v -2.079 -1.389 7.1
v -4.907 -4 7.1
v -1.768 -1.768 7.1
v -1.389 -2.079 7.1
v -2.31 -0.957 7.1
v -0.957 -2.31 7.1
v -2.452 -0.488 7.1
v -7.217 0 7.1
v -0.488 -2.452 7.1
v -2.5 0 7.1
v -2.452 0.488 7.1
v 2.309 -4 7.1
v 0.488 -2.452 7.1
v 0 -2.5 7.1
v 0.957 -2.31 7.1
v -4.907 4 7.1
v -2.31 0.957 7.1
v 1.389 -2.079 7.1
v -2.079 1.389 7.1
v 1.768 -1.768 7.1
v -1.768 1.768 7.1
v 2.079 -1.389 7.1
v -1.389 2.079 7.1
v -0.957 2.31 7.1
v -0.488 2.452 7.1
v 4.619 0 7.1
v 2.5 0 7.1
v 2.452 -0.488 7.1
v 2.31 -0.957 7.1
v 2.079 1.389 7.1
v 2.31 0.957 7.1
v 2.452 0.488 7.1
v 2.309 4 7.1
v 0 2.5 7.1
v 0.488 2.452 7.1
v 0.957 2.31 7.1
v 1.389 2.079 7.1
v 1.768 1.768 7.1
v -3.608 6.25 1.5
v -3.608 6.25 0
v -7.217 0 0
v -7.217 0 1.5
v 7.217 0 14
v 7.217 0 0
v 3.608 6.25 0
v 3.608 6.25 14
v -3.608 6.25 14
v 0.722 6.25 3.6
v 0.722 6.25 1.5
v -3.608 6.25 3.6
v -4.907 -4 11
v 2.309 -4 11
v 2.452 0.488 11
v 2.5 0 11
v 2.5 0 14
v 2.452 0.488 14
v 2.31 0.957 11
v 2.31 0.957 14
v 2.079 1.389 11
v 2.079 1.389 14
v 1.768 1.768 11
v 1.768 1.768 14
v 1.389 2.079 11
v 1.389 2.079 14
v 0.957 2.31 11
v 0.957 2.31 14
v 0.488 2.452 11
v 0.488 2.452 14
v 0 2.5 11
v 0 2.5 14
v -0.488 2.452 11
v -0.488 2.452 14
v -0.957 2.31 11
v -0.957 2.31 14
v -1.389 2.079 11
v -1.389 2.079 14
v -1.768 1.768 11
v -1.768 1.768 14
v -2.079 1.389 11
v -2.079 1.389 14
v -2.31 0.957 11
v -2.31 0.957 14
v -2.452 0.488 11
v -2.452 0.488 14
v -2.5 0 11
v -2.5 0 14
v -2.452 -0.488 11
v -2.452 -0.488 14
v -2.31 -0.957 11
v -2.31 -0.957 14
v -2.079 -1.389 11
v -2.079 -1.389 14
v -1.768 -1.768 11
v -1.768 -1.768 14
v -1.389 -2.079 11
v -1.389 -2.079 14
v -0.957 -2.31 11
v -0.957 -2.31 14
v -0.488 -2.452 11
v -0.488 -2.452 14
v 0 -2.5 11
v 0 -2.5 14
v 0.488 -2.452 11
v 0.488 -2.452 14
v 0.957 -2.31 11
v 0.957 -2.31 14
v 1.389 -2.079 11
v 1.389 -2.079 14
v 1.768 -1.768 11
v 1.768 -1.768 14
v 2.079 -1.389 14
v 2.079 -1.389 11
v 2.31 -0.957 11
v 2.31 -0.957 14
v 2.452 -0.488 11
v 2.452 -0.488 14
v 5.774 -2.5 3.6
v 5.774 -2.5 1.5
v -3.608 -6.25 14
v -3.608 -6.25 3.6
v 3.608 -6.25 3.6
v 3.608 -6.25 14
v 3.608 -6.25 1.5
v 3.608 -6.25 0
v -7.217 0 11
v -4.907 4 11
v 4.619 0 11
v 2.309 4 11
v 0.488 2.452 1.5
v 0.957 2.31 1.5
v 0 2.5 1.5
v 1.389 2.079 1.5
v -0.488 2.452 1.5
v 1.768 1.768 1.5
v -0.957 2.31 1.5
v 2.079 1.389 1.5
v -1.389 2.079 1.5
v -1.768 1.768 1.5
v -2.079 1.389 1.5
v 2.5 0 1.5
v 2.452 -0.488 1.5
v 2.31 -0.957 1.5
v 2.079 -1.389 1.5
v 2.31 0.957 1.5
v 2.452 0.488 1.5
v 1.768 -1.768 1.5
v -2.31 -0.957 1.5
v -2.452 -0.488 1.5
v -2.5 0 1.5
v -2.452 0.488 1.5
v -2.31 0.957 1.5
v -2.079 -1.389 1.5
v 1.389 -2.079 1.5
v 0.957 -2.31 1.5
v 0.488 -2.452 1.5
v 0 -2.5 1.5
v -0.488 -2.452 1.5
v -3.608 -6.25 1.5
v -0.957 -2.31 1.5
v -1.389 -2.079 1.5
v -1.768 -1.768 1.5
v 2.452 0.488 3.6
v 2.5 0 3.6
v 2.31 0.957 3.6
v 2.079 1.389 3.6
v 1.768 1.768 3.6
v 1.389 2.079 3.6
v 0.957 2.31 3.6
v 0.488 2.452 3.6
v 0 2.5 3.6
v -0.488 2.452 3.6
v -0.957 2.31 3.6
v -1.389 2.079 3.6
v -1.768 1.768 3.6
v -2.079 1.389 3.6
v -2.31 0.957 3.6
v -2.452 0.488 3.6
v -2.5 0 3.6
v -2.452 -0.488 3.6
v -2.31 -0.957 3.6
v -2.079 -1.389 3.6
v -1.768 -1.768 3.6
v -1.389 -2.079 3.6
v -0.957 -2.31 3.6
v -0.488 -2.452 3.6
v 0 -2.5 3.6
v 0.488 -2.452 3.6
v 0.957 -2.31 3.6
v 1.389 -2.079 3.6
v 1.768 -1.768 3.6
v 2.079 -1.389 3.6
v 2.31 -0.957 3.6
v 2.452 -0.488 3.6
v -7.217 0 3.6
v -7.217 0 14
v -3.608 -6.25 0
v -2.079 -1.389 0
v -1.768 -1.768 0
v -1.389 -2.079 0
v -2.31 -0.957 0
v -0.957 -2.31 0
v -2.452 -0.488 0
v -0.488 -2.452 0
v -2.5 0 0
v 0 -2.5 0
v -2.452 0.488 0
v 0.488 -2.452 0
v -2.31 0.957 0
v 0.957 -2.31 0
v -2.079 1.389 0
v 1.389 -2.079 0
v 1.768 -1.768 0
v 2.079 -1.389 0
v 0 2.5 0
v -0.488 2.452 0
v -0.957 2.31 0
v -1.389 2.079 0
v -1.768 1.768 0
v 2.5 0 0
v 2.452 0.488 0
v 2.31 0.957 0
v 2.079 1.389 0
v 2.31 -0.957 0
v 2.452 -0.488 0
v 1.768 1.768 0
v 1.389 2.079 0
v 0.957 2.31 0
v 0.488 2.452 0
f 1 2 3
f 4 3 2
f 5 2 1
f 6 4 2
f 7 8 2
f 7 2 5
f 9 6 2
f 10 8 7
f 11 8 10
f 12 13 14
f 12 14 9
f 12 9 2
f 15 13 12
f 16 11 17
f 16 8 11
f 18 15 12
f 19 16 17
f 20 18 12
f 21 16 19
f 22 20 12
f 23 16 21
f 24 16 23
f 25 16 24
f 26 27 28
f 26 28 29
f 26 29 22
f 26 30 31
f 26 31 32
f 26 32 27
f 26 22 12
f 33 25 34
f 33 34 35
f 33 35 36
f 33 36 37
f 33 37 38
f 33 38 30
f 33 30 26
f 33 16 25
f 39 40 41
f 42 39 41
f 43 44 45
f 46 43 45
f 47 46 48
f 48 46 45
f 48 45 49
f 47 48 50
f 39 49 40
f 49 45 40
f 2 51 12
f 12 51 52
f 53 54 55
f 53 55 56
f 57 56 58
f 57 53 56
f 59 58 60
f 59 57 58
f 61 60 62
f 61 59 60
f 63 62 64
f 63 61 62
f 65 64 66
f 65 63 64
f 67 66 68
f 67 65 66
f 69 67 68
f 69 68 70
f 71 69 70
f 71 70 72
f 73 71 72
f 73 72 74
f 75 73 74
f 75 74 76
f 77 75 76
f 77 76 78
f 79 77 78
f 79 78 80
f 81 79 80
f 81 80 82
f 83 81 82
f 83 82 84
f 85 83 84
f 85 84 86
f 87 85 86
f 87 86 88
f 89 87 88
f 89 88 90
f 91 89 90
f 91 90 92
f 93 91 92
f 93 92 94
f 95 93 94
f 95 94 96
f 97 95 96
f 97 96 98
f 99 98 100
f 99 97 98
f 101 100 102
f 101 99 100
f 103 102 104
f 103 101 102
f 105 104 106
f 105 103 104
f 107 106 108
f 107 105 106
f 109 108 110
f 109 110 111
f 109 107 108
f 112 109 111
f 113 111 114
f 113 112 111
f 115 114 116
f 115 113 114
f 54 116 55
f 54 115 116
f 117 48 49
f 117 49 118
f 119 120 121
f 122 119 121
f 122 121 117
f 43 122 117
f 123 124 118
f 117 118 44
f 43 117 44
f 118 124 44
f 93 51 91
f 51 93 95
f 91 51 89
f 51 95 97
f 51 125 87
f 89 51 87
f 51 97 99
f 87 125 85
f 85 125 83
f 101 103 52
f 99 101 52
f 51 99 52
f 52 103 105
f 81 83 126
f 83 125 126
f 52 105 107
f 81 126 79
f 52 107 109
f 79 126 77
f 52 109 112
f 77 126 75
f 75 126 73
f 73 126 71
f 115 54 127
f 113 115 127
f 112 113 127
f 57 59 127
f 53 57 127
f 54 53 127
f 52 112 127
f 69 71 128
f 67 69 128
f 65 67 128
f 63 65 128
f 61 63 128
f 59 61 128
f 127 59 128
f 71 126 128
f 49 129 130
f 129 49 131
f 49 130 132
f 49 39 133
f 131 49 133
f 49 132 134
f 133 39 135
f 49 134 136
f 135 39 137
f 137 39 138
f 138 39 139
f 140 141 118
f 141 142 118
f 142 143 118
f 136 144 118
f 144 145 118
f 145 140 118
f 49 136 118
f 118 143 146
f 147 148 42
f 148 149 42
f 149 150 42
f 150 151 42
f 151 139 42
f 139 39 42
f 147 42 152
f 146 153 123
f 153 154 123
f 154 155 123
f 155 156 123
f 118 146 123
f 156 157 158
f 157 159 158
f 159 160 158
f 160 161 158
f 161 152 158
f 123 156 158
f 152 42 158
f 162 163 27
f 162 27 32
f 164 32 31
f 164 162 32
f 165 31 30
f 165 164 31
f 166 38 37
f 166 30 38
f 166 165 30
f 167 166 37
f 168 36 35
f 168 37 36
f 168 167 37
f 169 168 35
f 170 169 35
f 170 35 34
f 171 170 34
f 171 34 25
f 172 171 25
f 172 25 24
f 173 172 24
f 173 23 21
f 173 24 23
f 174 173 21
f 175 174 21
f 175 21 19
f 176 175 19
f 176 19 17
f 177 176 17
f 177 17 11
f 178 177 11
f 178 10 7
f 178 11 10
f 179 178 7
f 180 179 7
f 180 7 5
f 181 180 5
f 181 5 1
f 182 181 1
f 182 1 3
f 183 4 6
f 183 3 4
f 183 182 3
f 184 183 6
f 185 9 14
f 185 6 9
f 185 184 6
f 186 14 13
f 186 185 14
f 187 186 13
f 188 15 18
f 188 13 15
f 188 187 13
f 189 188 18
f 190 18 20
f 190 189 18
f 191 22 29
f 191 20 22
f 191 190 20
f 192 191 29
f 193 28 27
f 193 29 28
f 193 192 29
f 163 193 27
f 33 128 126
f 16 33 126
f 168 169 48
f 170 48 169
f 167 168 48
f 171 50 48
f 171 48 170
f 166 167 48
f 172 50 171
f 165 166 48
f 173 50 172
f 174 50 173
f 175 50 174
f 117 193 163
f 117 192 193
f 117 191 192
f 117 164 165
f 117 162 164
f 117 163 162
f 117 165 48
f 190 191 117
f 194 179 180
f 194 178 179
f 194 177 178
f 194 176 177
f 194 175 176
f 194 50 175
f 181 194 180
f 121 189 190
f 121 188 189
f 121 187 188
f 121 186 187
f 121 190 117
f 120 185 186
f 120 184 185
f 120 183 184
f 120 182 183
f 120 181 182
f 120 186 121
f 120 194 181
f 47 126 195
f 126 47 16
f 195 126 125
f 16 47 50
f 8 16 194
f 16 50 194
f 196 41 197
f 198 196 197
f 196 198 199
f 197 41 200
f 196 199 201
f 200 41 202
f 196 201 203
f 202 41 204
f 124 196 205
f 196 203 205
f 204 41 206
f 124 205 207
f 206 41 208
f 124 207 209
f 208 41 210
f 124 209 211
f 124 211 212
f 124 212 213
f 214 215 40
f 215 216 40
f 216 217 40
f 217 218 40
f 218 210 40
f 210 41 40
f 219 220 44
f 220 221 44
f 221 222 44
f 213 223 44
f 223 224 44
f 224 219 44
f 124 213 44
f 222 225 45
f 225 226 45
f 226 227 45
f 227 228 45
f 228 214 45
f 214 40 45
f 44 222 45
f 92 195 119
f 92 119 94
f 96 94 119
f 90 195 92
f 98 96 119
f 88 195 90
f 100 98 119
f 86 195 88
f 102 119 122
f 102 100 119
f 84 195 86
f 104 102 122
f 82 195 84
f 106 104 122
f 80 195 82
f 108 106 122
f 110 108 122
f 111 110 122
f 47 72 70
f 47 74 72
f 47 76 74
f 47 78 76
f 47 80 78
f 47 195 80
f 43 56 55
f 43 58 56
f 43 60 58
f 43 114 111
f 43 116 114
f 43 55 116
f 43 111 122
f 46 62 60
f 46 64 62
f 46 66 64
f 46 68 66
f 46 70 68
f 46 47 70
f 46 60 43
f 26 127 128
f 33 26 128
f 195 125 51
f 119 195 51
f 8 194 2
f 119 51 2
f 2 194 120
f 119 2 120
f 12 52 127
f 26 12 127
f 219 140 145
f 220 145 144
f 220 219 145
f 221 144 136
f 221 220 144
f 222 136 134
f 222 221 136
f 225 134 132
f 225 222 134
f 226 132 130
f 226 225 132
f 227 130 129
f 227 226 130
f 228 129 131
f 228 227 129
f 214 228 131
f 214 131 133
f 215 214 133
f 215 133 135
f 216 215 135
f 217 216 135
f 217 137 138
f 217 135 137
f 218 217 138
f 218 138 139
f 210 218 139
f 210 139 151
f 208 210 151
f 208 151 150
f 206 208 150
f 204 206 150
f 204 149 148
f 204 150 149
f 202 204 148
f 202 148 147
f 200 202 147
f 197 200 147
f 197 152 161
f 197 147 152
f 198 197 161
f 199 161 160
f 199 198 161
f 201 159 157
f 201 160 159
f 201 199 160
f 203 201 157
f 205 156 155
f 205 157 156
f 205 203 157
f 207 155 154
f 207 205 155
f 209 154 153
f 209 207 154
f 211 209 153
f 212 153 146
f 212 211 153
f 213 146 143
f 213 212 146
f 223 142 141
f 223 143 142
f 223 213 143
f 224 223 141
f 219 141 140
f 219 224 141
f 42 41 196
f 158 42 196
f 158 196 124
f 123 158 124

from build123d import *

# Parameters (mm, degrees)
F0_R     = 2.5
F1_DEPTH = 14
F2_W     = 17.4719977542
F2_H     = 2.1
F3_DEPTH = 10
F5_START = -3
F5_DEPTH = 3.9


with BuildPart() as f1:
    # F0 (on Top) → F1 (new body)
    with BuildSketch(Plane.XY):
        Polygon((-3.6084391824, -6.25), (3.6084391824, -6.25), (7.2168783649, 0), (3.6084391824, 6.25), (-3.6084391824, 6.25), (-7.2168783649, 0), align=None)
        Circle(F0_R, mode=Mode.SUBTRACT)
    extrude(amount=F1_DEPTH)

    # F2 (on face) → F3 (cut)
    with BuildSketch(Plane(origin=(-5.4126587737, -3.125, 0), x_dir=(0.5, -0.8660254038, 0), z_dir=(-0.8660254038, -0.5, 0))):
        with Locations((0, 2.55)):
            Rectangle(F2_W, F2_H)
    extrude(amount=-F3_DEPTH, mode=Mode.SUBTRACT)

    # F4 (on face) → F5 (cut)
    with BuildSketch(Plane.XY.offset(14).offset(F5_START)):
        Polygon((2.3094010768, 4), (-2.3094010768, 4), (-10.6891589239, 4), (-10.3349462152, -4), (-2.3094010768, -4), (2.3094010768, -4), (4.6188021535, 0), align=None)
    extrude(amount=-F5_DEPTH, mode=Mode.SUBTRACT)


solid = f1.part
